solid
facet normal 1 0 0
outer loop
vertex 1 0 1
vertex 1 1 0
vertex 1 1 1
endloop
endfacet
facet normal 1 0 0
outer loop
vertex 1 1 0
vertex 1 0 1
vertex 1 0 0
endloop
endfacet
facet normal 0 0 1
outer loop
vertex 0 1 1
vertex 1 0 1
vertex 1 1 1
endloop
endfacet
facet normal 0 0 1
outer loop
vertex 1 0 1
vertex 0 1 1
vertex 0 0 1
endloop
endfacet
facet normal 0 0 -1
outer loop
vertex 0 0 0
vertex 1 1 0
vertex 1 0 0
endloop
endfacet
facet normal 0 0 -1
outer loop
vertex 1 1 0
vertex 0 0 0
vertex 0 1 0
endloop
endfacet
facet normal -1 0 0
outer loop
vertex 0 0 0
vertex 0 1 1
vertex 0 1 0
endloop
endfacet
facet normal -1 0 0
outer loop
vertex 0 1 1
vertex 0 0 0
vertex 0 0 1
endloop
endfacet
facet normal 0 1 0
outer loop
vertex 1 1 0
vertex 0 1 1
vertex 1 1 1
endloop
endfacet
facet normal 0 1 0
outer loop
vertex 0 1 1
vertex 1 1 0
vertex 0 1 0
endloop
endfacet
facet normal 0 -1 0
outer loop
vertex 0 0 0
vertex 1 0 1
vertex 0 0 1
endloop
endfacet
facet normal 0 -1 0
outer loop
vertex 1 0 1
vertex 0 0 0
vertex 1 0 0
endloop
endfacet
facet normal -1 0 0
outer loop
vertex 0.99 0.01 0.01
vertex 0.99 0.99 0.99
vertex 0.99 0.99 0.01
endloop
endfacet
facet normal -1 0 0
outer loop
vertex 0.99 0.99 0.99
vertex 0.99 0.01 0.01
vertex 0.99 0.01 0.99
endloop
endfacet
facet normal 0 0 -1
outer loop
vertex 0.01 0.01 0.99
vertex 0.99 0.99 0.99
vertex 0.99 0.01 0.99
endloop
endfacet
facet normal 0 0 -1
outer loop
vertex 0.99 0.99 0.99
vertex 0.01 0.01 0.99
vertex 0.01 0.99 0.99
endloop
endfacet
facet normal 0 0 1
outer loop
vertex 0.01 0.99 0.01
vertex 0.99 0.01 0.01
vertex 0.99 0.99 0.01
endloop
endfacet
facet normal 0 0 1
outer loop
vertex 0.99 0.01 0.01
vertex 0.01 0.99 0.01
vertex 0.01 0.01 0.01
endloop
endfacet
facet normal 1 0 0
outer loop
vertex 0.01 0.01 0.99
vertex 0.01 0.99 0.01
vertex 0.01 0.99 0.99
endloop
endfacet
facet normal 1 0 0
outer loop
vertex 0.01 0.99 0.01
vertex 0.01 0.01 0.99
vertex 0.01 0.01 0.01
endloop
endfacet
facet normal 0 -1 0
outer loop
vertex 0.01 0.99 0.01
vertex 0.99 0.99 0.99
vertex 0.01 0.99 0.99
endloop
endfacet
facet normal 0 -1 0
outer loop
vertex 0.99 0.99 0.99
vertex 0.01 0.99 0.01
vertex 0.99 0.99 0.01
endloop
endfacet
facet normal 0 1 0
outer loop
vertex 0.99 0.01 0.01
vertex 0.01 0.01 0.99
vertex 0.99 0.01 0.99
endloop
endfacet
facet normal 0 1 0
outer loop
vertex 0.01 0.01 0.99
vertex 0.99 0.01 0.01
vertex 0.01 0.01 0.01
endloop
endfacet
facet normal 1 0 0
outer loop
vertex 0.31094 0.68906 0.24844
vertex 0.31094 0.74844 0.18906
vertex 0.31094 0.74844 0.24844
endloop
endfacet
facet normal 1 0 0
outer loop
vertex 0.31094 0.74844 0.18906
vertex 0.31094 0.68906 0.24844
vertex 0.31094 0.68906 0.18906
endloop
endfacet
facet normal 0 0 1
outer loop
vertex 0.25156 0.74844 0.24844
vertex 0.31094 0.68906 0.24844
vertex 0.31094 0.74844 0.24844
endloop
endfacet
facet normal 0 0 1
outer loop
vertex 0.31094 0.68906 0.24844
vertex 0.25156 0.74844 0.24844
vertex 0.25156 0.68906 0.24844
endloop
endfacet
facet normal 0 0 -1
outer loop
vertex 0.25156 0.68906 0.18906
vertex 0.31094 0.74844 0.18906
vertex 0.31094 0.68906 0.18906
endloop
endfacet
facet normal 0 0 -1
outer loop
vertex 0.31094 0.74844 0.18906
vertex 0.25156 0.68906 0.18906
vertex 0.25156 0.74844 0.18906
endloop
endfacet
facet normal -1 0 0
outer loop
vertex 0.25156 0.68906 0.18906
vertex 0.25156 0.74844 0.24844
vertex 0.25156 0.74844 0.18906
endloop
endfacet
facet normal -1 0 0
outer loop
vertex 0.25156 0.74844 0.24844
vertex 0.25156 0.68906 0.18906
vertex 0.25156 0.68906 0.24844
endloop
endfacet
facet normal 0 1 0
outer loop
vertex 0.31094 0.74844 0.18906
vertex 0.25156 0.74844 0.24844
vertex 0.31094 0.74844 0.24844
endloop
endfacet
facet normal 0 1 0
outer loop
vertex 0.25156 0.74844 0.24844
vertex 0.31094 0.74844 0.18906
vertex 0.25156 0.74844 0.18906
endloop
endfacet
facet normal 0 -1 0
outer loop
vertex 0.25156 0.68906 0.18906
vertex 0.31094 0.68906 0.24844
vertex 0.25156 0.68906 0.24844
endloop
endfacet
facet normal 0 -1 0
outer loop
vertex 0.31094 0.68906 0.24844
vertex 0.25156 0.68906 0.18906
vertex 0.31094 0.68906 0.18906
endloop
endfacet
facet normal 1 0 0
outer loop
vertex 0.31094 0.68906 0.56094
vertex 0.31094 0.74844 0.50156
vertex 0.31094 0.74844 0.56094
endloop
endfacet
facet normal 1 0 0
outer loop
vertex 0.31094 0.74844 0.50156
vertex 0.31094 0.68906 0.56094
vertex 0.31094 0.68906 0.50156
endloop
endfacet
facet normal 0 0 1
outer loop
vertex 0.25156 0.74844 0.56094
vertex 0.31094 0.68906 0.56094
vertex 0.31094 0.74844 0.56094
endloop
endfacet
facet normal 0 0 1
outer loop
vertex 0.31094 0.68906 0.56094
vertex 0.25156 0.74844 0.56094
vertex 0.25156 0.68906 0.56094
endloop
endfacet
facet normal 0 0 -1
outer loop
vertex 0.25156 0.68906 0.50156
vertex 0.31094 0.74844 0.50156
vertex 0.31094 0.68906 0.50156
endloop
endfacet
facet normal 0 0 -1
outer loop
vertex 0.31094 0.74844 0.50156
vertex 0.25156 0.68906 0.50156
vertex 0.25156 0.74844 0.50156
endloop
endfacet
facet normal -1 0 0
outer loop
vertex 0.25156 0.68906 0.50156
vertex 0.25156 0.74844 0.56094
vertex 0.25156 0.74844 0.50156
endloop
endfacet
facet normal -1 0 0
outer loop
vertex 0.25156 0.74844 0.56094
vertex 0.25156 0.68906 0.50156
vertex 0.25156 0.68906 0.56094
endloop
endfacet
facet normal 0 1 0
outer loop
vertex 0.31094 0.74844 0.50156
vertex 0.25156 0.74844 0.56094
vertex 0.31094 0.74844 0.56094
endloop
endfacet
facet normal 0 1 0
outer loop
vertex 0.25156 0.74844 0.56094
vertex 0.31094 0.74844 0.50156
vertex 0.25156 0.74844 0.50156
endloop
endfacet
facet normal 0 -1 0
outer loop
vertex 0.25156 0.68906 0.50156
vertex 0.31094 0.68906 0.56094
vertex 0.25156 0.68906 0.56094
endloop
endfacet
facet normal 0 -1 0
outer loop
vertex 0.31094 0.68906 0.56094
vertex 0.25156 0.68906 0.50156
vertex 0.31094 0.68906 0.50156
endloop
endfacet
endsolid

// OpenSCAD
translate([0.28125, 0.71875, 0.21875]) color([0.8108724620266511, 0.9740415045642999, 0.3589706194244827]) cube([0.059375, 0.059375, 0.059375], center=true);
translate([0.28125, 0.71875, 0.53125]) color([0.5116699187033276, 0.23969624147332158, 0.07277686307420828]) cube([0.059375, 0.059375, 0.059375], center=true);
color([0.3,0.3,0.3,0.3]) difference() { cube([1,1,1]); translate([0.01,0.01,0.01]) cube([0.98,0.98,0.98]); }
